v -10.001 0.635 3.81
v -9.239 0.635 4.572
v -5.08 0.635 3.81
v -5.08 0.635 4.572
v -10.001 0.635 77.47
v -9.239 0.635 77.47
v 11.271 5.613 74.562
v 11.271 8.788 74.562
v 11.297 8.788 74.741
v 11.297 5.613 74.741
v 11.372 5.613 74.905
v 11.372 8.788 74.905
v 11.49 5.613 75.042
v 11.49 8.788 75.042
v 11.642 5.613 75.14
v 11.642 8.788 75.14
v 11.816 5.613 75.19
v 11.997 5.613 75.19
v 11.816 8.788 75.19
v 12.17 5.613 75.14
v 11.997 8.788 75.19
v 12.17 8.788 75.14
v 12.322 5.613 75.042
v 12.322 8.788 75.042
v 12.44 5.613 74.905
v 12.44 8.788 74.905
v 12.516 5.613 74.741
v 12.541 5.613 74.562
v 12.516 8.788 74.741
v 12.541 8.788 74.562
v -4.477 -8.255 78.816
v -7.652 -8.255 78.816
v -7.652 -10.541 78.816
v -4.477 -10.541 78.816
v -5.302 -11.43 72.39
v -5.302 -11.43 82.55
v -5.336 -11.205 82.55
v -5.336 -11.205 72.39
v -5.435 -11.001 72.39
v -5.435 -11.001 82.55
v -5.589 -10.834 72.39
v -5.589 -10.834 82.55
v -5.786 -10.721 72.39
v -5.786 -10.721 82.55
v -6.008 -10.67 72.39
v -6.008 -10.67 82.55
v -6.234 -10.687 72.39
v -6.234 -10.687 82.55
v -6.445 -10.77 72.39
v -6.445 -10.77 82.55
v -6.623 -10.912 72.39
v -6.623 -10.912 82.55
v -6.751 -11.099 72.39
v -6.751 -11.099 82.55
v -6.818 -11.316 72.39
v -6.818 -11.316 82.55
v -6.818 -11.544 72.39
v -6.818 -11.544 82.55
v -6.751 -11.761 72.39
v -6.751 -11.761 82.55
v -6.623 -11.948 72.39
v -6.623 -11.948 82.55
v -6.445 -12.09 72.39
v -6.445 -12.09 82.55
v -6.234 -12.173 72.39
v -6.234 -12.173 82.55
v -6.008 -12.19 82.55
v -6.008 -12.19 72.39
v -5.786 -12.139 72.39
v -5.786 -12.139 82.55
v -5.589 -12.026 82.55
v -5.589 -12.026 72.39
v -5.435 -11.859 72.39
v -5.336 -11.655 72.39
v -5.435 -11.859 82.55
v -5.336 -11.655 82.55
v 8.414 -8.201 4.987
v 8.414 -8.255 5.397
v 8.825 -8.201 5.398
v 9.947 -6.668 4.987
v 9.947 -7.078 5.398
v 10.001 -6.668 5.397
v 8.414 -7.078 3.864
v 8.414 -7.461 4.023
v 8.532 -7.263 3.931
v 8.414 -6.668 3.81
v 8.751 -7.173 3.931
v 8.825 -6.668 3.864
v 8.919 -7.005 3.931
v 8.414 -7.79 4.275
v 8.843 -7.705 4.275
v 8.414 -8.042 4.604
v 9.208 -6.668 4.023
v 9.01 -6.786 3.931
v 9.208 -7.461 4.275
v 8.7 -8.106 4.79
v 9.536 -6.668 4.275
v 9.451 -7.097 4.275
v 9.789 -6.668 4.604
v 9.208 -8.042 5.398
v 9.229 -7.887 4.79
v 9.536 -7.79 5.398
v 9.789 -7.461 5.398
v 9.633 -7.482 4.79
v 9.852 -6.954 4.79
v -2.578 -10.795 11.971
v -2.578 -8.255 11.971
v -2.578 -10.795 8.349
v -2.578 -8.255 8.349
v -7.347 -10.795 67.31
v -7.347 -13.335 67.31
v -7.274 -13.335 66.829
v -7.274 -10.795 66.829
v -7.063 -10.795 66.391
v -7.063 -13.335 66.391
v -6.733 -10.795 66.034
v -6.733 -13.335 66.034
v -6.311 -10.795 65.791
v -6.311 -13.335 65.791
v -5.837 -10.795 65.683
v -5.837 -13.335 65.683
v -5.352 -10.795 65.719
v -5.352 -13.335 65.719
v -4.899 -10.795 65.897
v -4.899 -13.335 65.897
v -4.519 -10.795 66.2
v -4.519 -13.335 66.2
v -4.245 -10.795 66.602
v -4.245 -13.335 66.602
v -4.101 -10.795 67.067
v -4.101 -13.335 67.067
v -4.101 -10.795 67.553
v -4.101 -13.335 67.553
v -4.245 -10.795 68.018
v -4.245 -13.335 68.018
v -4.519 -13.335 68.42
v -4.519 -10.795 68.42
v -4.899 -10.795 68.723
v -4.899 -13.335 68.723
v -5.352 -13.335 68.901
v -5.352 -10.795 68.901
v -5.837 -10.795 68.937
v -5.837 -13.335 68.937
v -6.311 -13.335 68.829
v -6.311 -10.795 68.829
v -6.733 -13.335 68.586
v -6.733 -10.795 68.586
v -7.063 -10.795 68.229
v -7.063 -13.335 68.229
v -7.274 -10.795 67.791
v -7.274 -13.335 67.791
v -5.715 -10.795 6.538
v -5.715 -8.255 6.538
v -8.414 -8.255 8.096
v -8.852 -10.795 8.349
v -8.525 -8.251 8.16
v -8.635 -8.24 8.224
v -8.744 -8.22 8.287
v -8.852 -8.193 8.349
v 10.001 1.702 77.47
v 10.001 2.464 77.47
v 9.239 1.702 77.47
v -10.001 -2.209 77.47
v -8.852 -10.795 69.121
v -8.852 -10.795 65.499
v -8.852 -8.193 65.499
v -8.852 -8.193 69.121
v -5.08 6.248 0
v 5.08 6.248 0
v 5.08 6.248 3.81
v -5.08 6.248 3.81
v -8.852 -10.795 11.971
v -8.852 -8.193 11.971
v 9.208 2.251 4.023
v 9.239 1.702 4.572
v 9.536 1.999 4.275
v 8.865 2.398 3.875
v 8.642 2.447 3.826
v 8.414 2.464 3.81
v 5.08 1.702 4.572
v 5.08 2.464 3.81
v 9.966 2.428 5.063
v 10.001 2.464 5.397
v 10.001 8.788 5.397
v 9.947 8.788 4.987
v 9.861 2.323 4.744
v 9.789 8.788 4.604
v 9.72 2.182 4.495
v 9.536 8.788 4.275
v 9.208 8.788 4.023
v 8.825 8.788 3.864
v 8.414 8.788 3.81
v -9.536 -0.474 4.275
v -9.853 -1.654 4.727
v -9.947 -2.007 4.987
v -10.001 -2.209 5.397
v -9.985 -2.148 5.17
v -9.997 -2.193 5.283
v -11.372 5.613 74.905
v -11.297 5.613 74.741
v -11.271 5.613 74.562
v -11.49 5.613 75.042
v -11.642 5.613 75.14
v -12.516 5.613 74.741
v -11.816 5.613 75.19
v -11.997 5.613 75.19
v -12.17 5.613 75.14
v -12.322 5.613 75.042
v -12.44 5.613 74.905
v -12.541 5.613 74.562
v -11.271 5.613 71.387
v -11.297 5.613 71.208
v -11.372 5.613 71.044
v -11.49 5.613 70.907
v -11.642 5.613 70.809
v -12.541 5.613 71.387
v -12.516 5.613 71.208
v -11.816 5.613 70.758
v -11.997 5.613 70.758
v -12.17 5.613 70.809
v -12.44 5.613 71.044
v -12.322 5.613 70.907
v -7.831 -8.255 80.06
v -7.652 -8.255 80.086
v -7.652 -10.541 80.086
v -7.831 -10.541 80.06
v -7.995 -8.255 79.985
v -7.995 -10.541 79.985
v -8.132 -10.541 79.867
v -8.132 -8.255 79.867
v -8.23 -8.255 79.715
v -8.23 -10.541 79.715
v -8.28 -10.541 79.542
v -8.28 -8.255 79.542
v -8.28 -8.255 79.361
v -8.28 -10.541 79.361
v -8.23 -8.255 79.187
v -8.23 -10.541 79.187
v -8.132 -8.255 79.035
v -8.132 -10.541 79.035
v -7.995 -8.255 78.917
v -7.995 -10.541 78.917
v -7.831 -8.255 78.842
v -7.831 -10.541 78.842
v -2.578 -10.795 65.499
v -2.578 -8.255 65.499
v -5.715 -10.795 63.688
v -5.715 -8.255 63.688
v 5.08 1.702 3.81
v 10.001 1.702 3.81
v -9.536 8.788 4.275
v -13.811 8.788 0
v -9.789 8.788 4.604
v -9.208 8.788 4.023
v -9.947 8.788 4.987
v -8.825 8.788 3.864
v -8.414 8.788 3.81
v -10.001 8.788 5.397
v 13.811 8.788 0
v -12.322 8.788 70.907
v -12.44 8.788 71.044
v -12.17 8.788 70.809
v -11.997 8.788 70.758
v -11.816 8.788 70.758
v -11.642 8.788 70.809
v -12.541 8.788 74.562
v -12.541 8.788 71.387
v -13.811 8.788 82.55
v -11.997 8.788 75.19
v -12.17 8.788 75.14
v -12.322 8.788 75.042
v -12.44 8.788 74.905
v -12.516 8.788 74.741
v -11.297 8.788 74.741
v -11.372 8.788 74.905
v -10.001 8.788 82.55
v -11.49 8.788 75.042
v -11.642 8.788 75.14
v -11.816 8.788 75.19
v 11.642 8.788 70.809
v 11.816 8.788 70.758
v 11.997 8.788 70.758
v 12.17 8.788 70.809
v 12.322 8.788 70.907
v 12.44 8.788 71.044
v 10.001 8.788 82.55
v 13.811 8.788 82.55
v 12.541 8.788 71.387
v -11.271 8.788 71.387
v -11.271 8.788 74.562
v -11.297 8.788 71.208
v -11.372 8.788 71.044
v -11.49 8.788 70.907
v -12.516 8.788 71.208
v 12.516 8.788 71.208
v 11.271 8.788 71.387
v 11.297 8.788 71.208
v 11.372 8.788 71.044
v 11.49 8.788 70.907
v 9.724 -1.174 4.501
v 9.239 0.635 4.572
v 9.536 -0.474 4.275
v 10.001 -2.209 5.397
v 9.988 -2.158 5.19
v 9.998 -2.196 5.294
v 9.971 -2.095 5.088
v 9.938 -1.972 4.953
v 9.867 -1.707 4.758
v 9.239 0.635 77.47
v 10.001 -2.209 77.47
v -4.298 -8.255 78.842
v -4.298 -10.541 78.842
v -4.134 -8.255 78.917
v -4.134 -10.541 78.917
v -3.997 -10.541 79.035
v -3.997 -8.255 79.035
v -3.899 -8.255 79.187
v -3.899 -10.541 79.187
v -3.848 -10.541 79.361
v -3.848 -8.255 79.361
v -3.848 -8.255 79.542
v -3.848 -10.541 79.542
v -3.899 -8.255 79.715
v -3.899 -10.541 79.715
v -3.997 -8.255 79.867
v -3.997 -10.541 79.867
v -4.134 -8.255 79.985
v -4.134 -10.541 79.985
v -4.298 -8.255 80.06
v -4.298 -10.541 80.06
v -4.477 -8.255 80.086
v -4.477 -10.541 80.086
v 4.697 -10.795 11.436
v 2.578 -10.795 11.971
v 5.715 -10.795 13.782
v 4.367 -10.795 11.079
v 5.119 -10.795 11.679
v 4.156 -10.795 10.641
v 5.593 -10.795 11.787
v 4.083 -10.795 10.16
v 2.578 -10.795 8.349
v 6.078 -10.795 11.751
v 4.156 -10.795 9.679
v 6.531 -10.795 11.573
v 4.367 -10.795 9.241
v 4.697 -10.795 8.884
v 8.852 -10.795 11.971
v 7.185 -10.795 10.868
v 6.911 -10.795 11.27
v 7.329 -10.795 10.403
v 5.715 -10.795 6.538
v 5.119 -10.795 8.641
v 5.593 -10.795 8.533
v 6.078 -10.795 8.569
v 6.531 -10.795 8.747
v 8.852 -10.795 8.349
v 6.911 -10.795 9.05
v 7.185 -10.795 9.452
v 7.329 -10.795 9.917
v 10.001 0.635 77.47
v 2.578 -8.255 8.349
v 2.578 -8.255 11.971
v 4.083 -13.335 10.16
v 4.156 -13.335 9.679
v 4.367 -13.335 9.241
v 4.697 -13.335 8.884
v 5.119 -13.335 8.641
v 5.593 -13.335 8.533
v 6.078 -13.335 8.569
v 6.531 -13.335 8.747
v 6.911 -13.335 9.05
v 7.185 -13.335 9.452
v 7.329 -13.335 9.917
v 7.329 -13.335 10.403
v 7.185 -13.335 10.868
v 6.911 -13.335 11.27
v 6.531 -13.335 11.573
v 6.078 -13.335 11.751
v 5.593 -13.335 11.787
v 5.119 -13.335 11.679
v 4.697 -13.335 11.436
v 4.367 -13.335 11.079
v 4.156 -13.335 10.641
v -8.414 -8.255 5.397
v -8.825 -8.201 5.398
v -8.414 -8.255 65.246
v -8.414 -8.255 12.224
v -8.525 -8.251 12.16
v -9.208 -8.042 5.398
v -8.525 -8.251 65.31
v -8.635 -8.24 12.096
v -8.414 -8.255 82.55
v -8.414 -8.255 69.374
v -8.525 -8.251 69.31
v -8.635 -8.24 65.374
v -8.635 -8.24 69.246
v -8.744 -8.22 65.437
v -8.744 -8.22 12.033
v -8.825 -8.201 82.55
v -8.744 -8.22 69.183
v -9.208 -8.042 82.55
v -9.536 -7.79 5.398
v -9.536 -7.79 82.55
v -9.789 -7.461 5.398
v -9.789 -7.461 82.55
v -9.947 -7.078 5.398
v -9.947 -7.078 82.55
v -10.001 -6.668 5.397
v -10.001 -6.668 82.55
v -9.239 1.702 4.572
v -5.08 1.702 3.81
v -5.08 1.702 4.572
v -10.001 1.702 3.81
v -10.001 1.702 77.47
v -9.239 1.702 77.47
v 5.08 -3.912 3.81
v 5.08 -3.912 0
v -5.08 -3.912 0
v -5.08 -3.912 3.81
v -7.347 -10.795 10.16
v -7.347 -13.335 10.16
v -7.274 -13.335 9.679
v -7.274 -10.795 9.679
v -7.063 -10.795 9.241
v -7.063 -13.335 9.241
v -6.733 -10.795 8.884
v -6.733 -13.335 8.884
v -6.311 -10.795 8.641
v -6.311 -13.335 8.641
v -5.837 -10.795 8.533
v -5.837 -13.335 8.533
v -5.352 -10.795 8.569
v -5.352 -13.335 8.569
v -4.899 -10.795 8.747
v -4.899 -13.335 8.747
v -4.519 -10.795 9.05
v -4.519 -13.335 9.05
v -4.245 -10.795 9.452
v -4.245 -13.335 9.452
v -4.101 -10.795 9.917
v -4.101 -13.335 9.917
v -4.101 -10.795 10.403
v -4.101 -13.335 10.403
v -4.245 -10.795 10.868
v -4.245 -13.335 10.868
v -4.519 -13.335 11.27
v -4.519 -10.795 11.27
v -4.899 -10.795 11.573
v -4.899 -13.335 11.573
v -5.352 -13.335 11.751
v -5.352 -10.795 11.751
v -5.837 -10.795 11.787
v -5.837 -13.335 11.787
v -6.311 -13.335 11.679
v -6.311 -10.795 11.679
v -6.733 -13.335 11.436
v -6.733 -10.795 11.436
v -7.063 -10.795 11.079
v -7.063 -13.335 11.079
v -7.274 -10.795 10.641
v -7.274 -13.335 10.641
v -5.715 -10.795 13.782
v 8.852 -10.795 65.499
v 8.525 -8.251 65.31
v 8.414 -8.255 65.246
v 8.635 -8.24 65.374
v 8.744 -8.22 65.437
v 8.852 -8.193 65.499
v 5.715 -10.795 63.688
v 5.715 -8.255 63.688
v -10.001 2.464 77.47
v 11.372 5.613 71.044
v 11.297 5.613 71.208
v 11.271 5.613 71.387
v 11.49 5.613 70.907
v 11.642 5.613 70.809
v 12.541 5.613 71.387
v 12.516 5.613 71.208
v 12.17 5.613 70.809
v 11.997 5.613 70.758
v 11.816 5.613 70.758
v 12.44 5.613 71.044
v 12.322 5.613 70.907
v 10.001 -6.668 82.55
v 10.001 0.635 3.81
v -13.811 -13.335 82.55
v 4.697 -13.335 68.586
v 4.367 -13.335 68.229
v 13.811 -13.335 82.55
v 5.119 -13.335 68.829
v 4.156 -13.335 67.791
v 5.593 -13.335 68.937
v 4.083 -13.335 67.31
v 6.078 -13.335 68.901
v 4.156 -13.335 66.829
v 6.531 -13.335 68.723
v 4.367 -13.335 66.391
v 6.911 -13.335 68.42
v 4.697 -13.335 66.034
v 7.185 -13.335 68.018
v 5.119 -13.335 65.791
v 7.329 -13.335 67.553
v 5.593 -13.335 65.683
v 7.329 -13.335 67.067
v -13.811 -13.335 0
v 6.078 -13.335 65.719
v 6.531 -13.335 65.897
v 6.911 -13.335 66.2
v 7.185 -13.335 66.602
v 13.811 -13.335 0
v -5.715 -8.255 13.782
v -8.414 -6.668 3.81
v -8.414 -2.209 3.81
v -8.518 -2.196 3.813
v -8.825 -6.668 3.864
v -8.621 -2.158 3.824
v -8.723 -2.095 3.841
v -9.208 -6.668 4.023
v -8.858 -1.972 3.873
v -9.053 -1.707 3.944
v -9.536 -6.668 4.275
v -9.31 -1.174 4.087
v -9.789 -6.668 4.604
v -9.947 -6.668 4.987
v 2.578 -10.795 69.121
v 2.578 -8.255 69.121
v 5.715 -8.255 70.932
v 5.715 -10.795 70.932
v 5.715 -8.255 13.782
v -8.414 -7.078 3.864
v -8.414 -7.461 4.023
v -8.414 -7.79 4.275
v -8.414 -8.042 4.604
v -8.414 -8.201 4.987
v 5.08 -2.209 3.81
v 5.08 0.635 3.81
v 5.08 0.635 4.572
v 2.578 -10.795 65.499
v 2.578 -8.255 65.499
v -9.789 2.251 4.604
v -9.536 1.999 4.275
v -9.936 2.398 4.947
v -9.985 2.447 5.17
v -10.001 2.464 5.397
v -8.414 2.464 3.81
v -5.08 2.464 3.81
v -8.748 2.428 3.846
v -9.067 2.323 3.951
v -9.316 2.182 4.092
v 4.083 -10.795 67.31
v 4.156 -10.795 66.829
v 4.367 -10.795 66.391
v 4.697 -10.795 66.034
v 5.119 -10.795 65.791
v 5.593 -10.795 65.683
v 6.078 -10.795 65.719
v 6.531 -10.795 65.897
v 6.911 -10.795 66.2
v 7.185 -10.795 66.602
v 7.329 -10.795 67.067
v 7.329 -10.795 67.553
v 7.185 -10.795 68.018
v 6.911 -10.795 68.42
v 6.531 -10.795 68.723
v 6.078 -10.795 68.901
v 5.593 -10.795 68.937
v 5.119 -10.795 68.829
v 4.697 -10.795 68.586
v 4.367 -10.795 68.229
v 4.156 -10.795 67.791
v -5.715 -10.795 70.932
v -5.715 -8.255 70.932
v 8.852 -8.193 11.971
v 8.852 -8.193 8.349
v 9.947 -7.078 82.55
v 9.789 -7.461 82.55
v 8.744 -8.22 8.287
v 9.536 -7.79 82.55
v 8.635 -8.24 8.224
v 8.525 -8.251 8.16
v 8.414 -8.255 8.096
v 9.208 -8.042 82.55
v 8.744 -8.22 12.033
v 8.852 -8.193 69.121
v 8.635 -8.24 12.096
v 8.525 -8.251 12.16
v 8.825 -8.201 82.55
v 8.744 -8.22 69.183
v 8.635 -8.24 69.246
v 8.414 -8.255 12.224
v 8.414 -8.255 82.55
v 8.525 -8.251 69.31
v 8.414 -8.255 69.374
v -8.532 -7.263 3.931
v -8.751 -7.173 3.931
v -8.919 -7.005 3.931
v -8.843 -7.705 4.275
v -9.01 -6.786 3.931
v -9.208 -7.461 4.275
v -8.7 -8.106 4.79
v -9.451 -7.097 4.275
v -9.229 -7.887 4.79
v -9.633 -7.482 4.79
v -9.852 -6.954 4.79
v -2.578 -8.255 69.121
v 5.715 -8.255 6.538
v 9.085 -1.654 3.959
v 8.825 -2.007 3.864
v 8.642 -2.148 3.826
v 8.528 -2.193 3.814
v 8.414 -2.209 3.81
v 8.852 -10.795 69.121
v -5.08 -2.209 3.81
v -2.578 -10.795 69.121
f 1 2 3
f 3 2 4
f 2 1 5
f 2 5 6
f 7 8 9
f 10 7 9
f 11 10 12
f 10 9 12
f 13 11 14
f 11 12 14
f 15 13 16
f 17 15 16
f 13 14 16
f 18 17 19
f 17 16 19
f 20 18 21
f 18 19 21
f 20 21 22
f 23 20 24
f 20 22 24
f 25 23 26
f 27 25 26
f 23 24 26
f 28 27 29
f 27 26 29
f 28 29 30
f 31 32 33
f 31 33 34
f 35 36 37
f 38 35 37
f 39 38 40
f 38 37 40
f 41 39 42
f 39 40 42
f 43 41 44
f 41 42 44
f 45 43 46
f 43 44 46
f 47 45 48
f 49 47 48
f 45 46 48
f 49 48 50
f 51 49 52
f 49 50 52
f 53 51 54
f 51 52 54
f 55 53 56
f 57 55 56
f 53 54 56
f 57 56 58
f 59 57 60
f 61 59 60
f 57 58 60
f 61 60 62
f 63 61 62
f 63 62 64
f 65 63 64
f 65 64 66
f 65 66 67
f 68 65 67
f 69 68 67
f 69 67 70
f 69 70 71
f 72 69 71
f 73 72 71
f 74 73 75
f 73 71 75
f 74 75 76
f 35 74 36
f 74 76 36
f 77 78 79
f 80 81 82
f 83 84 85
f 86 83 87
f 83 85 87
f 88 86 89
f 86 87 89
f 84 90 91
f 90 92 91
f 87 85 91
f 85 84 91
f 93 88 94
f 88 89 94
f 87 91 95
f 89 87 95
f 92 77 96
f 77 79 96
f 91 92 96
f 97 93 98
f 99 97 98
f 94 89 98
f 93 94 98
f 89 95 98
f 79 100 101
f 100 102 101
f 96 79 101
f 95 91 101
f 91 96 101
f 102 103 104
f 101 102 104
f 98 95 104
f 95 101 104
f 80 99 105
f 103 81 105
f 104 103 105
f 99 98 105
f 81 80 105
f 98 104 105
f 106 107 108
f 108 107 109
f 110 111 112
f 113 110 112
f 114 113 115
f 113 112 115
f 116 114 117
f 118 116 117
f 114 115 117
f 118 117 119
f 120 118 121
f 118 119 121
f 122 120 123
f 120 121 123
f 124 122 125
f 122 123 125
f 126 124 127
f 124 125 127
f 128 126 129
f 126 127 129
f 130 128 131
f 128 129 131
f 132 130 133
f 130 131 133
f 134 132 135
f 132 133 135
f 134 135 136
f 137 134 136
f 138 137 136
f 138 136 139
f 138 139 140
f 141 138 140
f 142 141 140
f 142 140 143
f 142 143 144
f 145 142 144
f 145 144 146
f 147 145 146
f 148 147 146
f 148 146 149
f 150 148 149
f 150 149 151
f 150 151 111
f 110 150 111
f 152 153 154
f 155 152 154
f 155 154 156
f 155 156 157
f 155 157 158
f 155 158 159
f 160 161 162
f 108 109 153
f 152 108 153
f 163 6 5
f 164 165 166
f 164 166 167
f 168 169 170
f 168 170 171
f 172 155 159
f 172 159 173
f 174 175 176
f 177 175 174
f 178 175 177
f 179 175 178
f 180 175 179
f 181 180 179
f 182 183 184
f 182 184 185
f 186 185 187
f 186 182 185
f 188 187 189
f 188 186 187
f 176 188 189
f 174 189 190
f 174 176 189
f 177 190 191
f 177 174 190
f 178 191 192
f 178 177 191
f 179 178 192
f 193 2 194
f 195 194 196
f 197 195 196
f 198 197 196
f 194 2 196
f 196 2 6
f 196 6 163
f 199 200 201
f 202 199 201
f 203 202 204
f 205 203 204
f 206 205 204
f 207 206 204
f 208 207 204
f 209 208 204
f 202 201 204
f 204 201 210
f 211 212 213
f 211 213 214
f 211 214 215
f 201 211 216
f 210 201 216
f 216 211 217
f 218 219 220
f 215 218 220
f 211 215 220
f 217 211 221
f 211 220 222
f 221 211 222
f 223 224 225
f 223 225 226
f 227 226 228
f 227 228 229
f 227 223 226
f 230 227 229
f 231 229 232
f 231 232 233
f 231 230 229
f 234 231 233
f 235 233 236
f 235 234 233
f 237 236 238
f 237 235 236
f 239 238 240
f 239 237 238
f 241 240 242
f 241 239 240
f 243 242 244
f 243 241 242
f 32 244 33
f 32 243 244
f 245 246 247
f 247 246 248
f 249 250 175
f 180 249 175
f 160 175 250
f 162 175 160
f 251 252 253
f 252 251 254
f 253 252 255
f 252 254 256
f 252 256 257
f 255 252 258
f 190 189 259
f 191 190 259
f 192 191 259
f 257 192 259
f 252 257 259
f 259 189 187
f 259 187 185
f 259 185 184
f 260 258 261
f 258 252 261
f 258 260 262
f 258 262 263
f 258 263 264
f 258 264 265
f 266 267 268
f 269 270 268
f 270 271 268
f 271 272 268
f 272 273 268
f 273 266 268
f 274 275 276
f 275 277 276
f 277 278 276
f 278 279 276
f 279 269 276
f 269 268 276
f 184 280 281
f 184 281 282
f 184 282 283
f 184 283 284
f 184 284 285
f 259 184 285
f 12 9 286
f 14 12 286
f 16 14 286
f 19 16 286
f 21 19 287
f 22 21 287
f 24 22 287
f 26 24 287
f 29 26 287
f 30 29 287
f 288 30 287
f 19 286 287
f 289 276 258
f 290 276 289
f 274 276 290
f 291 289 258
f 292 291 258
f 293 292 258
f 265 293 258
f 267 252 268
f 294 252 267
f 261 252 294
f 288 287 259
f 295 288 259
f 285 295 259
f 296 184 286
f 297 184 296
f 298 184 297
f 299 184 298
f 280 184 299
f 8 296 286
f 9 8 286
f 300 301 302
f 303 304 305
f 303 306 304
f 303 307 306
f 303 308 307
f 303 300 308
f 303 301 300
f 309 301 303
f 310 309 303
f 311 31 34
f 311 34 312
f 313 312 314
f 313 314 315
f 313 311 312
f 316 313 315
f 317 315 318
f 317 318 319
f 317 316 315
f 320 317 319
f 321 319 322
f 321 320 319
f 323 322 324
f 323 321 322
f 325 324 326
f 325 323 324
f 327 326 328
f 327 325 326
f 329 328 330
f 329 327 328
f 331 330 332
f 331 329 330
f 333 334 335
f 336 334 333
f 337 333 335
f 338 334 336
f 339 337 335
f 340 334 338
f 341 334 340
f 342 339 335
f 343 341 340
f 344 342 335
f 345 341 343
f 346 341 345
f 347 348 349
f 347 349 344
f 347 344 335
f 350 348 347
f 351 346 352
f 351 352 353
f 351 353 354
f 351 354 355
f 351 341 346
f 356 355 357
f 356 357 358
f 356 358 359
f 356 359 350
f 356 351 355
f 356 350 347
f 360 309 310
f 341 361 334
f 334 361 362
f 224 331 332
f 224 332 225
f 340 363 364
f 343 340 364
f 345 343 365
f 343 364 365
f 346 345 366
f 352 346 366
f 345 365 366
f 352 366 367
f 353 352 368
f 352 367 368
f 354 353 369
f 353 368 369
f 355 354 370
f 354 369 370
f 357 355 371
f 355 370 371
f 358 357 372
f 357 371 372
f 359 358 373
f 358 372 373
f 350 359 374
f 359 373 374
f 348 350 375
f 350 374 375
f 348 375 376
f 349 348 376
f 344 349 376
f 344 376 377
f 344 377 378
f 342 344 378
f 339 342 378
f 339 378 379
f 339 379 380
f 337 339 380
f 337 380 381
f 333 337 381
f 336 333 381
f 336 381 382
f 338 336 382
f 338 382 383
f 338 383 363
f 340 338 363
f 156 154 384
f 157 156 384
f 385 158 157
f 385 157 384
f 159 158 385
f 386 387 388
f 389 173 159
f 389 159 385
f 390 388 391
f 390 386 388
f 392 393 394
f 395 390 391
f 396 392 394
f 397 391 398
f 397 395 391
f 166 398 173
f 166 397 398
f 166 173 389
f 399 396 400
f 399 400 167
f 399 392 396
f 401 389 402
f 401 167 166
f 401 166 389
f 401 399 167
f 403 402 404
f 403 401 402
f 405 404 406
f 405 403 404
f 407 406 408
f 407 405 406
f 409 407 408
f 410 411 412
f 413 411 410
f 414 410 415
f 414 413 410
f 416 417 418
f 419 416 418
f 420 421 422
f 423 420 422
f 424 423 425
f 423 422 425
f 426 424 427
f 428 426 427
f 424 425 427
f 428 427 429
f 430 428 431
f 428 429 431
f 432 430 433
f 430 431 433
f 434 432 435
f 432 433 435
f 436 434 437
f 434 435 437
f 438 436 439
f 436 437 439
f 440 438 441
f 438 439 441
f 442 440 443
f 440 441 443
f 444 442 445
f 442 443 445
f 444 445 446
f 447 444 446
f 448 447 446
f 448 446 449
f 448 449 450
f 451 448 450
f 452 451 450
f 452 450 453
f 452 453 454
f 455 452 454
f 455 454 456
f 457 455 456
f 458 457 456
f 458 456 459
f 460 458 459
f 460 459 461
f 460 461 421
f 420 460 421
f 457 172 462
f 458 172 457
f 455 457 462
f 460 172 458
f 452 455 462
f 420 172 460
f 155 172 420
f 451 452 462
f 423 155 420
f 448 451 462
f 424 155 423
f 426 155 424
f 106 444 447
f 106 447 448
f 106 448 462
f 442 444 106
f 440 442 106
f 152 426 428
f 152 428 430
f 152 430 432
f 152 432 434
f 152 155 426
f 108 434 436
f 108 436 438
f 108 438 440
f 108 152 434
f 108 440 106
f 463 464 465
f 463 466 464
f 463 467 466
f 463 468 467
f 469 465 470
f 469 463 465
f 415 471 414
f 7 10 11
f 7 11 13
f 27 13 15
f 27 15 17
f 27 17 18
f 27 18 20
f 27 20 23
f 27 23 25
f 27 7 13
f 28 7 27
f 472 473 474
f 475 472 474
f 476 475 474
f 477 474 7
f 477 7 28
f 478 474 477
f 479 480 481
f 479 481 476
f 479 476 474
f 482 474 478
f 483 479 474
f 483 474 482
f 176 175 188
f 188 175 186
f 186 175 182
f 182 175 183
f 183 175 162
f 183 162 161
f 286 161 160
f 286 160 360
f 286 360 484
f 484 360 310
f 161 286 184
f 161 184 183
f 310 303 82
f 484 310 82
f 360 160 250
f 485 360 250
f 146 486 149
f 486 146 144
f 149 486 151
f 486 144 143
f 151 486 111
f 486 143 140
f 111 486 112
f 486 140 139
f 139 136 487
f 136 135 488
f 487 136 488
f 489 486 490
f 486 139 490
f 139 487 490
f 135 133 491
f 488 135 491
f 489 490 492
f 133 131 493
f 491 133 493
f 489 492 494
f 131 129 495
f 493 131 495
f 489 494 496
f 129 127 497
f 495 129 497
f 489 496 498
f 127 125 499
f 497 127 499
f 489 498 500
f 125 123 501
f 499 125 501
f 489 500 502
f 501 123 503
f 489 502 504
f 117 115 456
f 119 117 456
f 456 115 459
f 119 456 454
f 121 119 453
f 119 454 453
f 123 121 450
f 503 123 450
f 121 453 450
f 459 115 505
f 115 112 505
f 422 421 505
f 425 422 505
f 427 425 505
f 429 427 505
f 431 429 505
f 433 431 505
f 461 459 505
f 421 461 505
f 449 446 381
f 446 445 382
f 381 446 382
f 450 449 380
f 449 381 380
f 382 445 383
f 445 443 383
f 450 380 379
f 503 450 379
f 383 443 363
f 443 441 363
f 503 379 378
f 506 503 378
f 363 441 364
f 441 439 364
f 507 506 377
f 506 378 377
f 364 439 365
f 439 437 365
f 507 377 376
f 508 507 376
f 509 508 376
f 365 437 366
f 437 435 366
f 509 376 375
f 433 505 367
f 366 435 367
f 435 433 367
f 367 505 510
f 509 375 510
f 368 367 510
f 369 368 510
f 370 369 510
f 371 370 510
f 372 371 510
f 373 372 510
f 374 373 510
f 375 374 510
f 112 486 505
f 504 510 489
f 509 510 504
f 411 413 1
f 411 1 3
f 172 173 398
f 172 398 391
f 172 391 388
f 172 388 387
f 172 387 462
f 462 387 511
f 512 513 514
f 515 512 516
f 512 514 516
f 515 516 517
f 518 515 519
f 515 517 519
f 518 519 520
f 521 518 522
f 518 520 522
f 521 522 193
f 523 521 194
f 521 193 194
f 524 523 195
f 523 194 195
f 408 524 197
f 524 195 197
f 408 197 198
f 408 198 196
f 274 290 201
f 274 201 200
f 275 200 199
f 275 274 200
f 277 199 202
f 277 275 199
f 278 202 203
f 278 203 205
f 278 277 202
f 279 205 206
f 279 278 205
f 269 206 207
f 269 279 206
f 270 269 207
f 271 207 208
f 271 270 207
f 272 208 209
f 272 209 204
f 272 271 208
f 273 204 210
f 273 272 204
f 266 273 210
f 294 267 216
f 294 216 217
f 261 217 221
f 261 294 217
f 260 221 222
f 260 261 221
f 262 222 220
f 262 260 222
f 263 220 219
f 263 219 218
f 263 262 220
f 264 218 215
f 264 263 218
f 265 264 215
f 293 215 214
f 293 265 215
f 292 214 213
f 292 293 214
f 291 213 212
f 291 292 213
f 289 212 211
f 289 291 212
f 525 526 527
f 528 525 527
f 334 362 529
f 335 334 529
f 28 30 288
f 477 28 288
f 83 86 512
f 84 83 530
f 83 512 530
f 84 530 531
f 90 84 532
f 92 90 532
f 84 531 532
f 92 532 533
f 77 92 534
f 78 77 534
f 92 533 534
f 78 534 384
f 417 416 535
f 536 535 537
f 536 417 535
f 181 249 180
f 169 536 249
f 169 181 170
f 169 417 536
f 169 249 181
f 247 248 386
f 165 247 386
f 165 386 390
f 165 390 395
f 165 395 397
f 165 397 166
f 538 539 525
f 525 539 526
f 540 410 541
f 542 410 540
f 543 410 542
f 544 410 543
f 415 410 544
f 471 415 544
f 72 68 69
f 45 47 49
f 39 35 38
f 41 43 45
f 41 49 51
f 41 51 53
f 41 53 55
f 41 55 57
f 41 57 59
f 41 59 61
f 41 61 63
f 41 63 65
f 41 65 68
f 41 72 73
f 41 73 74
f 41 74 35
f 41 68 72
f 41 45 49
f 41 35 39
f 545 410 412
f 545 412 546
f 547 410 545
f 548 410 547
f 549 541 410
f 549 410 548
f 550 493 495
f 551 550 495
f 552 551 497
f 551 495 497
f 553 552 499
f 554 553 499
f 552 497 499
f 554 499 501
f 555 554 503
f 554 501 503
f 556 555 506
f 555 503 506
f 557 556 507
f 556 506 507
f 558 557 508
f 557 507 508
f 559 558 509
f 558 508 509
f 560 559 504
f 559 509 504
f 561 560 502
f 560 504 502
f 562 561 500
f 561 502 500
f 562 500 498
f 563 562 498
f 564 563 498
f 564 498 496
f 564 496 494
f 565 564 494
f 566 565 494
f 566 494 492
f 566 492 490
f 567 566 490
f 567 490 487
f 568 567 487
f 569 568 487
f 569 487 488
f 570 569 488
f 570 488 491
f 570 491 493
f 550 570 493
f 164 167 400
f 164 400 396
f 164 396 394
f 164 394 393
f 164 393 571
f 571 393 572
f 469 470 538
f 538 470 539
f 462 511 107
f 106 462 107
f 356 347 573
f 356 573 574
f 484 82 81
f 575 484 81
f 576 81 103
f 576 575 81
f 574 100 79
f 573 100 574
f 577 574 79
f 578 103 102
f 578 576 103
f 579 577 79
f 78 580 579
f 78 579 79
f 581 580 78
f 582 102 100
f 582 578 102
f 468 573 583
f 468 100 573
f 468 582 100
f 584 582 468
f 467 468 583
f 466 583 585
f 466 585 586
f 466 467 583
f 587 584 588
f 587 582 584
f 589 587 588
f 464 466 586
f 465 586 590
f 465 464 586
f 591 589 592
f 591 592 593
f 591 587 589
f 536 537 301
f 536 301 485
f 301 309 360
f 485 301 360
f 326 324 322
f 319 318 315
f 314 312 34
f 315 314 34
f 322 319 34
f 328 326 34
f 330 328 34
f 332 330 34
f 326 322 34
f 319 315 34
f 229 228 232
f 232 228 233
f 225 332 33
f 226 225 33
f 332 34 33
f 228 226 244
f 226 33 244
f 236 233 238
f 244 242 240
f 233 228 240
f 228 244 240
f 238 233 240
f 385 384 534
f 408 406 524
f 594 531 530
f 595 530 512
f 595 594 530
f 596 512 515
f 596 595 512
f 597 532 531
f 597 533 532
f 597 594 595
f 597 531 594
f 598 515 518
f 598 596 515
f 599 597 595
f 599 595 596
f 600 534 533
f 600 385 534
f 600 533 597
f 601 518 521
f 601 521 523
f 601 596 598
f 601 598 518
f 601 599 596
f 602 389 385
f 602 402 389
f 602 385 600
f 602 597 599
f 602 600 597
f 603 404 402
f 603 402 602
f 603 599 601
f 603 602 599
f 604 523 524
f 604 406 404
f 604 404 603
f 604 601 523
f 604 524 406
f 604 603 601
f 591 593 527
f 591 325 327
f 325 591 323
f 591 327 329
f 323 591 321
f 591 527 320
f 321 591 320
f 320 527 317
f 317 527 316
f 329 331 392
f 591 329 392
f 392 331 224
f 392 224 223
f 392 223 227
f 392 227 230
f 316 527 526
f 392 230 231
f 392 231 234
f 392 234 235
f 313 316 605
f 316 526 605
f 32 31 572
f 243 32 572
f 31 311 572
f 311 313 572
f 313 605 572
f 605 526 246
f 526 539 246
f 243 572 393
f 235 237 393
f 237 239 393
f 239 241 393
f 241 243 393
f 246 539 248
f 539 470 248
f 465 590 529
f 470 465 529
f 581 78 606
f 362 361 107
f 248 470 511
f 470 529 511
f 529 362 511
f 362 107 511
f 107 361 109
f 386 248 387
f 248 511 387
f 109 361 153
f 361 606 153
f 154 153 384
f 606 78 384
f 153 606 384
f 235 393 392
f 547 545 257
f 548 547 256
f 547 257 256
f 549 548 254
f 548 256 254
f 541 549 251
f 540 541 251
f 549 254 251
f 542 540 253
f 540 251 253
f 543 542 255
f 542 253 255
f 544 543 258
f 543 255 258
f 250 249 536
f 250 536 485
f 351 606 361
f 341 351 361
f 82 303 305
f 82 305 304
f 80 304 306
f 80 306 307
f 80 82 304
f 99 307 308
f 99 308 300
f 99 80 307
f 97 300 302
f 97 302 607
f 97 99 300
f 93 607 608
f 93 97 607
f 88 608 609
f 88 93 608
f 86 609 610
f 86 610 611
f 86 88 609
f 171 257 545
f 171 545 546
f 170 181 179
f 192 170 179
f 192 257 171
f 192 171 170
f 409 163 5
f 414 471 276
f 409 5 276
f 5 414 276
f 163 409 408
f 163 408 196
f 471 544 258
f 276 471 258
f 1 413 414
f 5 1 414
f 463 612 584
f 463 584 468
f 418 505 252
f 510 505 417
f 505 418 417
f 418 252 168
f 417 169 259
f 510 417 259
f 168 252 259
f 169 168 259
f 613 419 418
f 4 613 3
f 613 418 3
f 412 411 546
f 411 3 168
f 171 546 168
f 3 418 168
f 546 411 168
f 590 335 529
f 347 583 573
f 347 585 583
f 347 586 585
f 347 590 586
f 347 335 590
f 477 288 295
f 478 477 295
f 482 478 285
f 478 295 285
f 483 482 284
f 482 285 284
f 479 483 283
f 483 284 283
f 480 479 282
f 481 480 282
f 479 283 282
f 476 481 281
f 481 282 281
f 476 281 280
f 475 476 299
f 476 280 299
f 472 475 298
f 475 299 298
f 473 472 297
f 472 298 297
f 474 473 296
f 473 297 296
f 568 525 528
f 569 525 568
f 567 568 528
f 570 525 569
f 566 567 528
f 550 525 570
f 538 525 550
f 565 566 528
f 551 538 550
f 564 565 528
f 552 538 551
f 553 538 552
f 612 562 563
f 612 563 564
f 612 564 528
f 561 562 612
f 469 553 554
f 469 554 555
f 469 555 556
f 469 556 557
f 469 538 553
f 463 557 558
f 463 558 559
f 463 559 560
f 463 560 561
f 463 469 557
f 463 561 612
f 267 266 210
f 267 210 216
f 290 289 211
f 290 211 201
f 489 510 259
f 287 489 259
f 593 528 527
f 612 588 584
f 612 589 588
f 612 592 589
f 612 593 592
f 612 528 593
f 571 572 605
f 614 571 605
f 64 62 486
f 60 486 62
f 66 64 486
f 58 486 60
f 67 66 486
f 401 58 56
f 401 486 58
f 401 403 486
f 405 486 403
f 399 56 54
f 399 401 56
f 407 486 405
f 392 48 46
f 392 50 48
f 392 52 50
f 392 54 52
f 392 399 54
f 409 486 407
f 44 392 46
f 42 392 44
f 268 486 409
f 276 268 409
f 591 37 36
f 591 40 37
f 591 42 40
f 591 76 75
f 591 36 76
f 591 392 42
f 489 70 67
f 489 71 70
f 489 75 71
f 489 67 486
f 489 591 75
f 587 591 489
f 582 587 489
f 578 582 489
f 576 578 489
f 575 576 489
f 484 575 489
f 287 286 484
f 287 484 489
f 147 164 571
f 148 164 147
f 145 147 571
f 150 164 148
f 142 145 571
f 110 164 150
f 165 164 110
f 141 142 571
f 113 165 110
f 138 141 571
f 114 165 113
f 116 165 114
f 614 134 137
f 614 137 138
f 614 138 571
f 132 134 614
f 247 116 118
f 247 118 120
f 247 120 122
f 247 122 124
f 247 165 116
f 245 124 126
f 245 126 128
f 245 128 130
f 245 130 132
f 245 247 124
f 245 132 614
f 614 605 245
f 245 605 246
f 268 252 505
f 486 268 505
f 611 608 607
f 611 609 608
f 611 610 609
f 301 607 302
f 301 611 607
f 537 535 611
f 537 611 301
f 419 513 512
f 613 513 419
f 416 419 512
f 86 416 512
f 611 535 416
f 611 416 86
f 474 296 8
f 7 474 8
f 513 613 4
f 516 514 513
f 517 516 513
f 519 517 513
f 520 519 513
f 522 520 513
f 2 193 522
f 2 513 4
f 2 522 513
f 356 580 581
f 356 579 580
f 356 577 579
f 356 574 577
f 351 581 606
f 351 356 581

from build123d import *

# Parameters (mm, degrees)
BOSS_EXTRUDE1_DEPTH            = 82.55
BOSS_EXTRUDE2_START            = -5.08
BOSS_EXTRUDE2_DEPTH            = 77.47
BOSS_EXTRUDE4_REACH            = 89.467
SKETCH8_W                      = 27.6225
SKETCH8_H                      = 3.81
BOSS_EXTRUDE5_REACH            = 88.945
CUT_EXTRUDE1_REACH             = 86.753
SKETCH10_W                     = 10.16
SKETCH10_H                     = 10.16
SKETCH11_W                     = 27.6225
SKETCH11_H                     = 3.2766
CUT_EXTRUDE2_DEPTH             = 85.753025619
FILLET3_R                      = 1.5875
CUT_EXTRUDE3_DEPTH             = 2.286
CUT_EXTRUDE4_DEPTH             = 3.175
F_4_CLEARANCE_HOLE1_D          = 3.2639
CUT_EXTRUDE5_DEPTH             = 2.54
CUT_EXTRUDE5_DIRECTION_2_REACH = 87.415
SKETCH18_R                     = 0.762
CUT_EXTRUDE6_DEPTH             = 10.16


with BuildPart() as part:
    # Sketch1 → Boss-Extrude1 (new body)
    with BuildSketch(Plane.XY):
        Polygon((10.00125, 12.065), (10.00125, -8.255), (-10.00125, -8.255), (-10.00125, 12.065), (-13.81125, 12.065), (-13.81125, -13.335), (13.81125, -13.335), (13.81125, 12.065), align=None)
    extrude(amount=BOSS_EXTRUDE1_DEPTH)

    # Sketch3 → Boss-Extrude2 (add)
    with BuildSketch(Plane.XY.offset(82.55).offset(BOSS_EXTRUDE2_START)):
        Polygon((10.00125, 1.7018), (9.23925, 1.7018), (10.00125, 2.4638), align=None)
        Polygon((10.00125, 0.635), (9.23925, 0.635), (10.00125, -2.208822715), align=None)
        Polygon((-10.00125, 2.4638), (-10.00125, 1.7018), (-9.23925, 1.7018), align=None)
        Polygon((-10.00125, -2.208822715), (-10.00125, 0.635), (-9.23925, 0.635), align=None)
    extrude(amount=-BOSS_EXTRUDE2_DEPTH)

    # Boss-Extrude4: up to this face of the body (flat: up to its plane)
    boss_extrude4_end = Plane(part.part.faces().sort_by_distance((0, -8.255, 41.275))[0])
    # Sketch8 → Boss-Extrude4 (add, up to the picked face)
    with BuildSketch(Plane(origin=(0, 12.065, 0), x_dir=(1, 0, 0), z_dir=(0, 1, 0)), mode=Mode.PRIVATE) as boss_extrude4_sk1:
        with Locations((0, -1.905)):
            Rectangle(SKETCH8_W, SKETCH8_H)
    boss_extrude4_tool1 = split(extrude(boss_extrude4_sk1.sketch, amount=-BOSS_EXTRUDE4_REACH, mode=Mode.PRIVATE), bisect_by=boss_extrude4_end, keep=Keep.BOTH, mode=Mode.PRIVATE)
    add(boss_extrude4_tool1.solids().sort_by(Axis((0, 12.065, 1.905), (0, -1, 0)))[0])

    # Boss-Extrude5: up to this face of the body (flat: up to its plane)
    boss_extrude5_end = Plane(part.part.faces().sort_by_distance((10.00125, 7.2644, 4.623196778))[0])
    # Sketch9 → Boss-Extrude5 (add, up to the picked face)
    with BuildSketch(Plane(origin=(-10.00125, 0, 0), x_dir=(0, 0, -1), z_dir=(1, 0, 0)), mode=Mode.PRIVATE) as boss_extrude5_sk1:
        Polygon((-3.81, 2.4638), (-3.81, 1.7018), (-4.572, 1.7018), align=None)
    boss_extrude5_tool1 = split(extrude(boss_extrude5_sk1.sketch, amount=BOSS_EXTRUDE5_REACH, mode=Mode.PRIVATE), bisect_by=boss_extrude5_end, keep=Keep.BOTH, mode=Mode.PRIVATE)
    # Sketch9 → Boss-Extrude5 (add, up to the picked face)
    with BuildSketch(Plane(origin=(-10.00125, 0, 0), x_dir=(0, 0, -1), z_dir=(1, 0, 0)), mode=Mode.PRIVATE) as boss_extrude5_sk2:
        Polygon((-3.81, 0.635), (-3.81, -2.208822715), (-4.572, 0.635), align=None)
    boss_extrude5_tool2 = split(extrude(boss_extrude5_sk2.sketch, amount=BOSS_EXTRUDE5_REACH, mode=Mode.PRIVATE), bisect_by=boss_extrude5_end, keep=Keep.BOTH, mode=Mode.PRIVATE)
    add(boss_extrude5_tool1.solids().sort_by(Axis((-10.00125, 1.9558, 4.064), (1, 0, 0)))[0])
    add(boss_extrude5_tool2.solids().sort_by(Axis((-10.00125, -0.312941, 4.064), (1, 0, 0)))[0])

    # Sketch10 → Cut-Extrude1 (cut, up to next)
    with BuildSketch(Plane(origin=(0, 0, 0), x_dir=(-1, 0, 0), z_dir=(0, 0, -1)), mode=Mode.PRIVATE) as cut_extrude1_sk1:
        with Locations((0, 1.1684)):
            Rectangle(SKETCH10_W, SKETCH10_H)
    cut_extrude1_tool1 = extrude(cut_extrude1_sk1.sketch, amount=-CUT_EXTRUDE1_REACH, mode=Mode.PRIVATE) & part.part
    add(cut_extrude1_tool1.solids().sort_by_distance((0, 1.1684, 0))[0], mode=Mode.SUBTRACT)

    # Sketch11 → Cut-Extrude2 (cut, through all)
    with BuildSketch(Plane.XY.offset(82.55)):
        with Locations((0, 10.4267)):
            Rectangle(SKETCH11_W, SKETCH11_H)
    extrude(amount=-CUT_EXTRUDE2_DEPTH, mode=Mode.SUBTRACT)

    # Fillet3
    fillet3_edges = [part.edges().sort_by_distance(p)[0] for p in [
        (-10.00125, -8.255, 43.18),
        (10.00125, -8.255, 43.18),
        (10.00125, 5.6261, 3.81),
        (0, -8.255, 3.81),
        (10.00125, -5.231911358, 3.81),
        (-10.00125, 5.6261, 3.81),
        (-10.00125, -5.231911358, 3.81),
    ]]
    fillet(fillet3_edges, radius=FILLET3_R)

    # Sketch13 → Cut-Extrude3 (cut)
    with BuildSketch(Plane(origin=(0, -8.255, 0), x_dir=(1, 0, 0), z_dir=(0, 1, 0))):
        with BuildLine():
            Line((-7.651886934, -78.8162), (-4.476886934, -78.8162))
            ThreePointArc((-4.476886934, -78.8162), (-3.841886934, -79.4512), (-4.476886934, -80.0862))
            Line((-4.476886934, -80.0862), (-7.651886934, -80.0862))
            ThreePointArc((-7.651886934, -80.0862), (-8.286886934, -79.4512), (-7.651886934, -78.8162))
        make_face()
    extrude(amount=-CUT_EXTRUDE3_DEPTH, mode=Mode.SUBTRACT)

    # Sketch14 → Cut-Extrude4 (cut)
    with BuildSketch(Plane(origin=(0, 8.7884, 0), x_dir=(1, 0, 0), z_dir=(0, 1, 0))):
        with BuildLine():
            Line((-11.27125, -71.386954), (-11.27125, -74.561954))
            ThreePointArc((-11.27125, -74.561954), (-11.90625, -75.196954), (-12.54125, -74.561954))
            Line((-12.54125, -74.561954), (-12.54125, -71.386954))
            ThreePointArc((-12.54125, -71.386954), (-11.90625, -70.751954), (-11.27125, -71.386954))
        make_face()
        with BuildLine():
            Line((11.27125, -71.386954), (11.27125, -74.561954))
            ThreePointArc((11.27125, -74.561954), (11.90625, -75.196954), (12.54125, -74.561954))
            Line((12.54125, -74.561954), (12.54125, -71.386954))
            ThreePointArc((12.54125, -71.386954), (11.90625, -70.751954), (11.27125, -71.386954))
        make_face()
    extrude(amount=-CUT_EXTRUDE4_DEPTH, mode=Mode.SUBTRACT)

    # #4 Clearance Hole1 (through all)
    with Locations(Plane(origin=(0, -8.255, 0), x_dir=(1, 0, 0), z_dir=(0, 1, 0))):
        with Locations((-5.715, -10.16), (5.715, -67.31), (-5.715, -67.31), (5.715, -10.16)):
            Hole(F_4_CLEARANCE_HOLE1_D / 2)

    # Sketch17 → Cut-Extrude5 (cut)
    with BuildSketch(Plane(origin=(0, -8.255, 0), x_dir=(1, 0, 0), z_dir=(0, 1, 0))):
        Polygon((-5.715, -13.782180119), (-2.5781, -11.971090059), (-2.5781, -8.348909941), (-5.715, -6.537819881), (-8.8519, -8.348909941), (-8.8519, -11.971090059), align=None)
        Polygon((5.715, -13.782180119), (8.8519, -11.971090059), (8.8519, -8.348909941), (5.715, -6.537819881), (2.5781, -8.348909941), (2.5781, -11.971090059), align=None)
        Polygon((-5.715, -63.687819881), (-8.8519, -65.498909941), (-8.8519, -69.121090059), (-5.715, -70.932180119), (-2.5781, -69.121090059), (-2.5781, -65.498909941), align=None)
        Polygon((5.715, -63.687819881), (2.5781, -65.498909941), (2.5781, -69.121090059), (5.715, -70.932180119), (8.8519, -69.121090059), (8.8519, -65.498909941), align=None)
    extrude(amount=-CUT_EXTRUDE5_DEPTH, mode=Mode.SUBTRACT)

    # Sketch17 → Cut-Extrude5 direction 2 (cut, up to next)
    with BuildSketch(Plane(origin=(0, -8.255, 0), x_dir=(1, 0, 0), z_dir=(0, 1, 0)), mode=Mode.PRIVATE) as cut_extrude5_direction_2_sk1:
        Polygon((-5.715, -13.782180119), (-2.5781, -11.971090059), (-2.5781, -8.348909941), (-5.715, -6.537819881), (-8.8519, -8.348909941), (-8.8519, -11.971090059), align=None)
    cut_extrude5_direction_2_tool1 = extrude(cut_extrude5_direction_2_sk1.sketch, amount=CUT_EXTRUDE5_DIRECTION_2_REACH, mode=Mode.PRIVATE) & part.part
    # Sketch17 → Cut-Extrude5 direction 2 (cut, up to next)
    with BuildSketch(Plane(origin=(0, -8.255, 0), x_dir=(1, 0, 0), z_dir=(0, 1, 0)), mode=Mode.PRIVATE) as cut_extrude5_direction_2_sk2:
        Polygon((5.715, -13.782180119), (8.8519, -11.971090059), (8.8519, -8.348909941), (5.715, -6.537819881), (2.5781, -8.348909941), (2.5781, -11.971090059), align=None)
    cut_extrude5_direction_2_tool2 = extrude(cut_extrude5_direction_2_sk2.sketch, amount=CUT_EXTRUDE5_DIRECTION_2_REACH, mode=Mode.PRIVATE) & part.part
    # Sketch17 → Cut-Extrude5 direction 2 (cut, up to next)
    with BuildSketch(Plane(origin=(0, -8.255, 0), x_dir=(1, 0, 0), z_dir=(0, 1, 0)), mode=Mode.PRIVATE) as cut_extrude5_direction_2_sk3:
        Polygon((-5.715, -63.687819881), (-8.8519, -65.498909941), (-8.8519, -69.121090059), (-5.715, -70.932180119), (-2.5781, -69.121090059), (-2.5781, -65.498909941), align=None)
    cut_extrude5_direction_2_tool3 = extrude(cut_extrude5_direction_2_sk3.sketch, amount=CUT_EXTRUDE5_DIRECTION_2_REACH, mode=Mode.PRIVATE) & part.part
    # Sketch17 → Cut-Extrude5 direction 2 (cut, up to next)
    with BuildSketch(Plane(origin=(0, -8.255, 0), x_dir=(1, 0, 0), z_dir=(0, 1, 0)), mode=Mode.PRIVATE) as cut_extrude5_direction_2_sk4:
        Polygon((5.715, -63.687819881), (2.5781, -65.498909941), (2.5781, -69.121090059), (5.715, -70.932180119), (8.8519, -69.121090059), (8.8519, -65.498909941), align=None)
    cut_extrude5_direction_2_tool4 = extrude(cut_extrude5_direction_2_sk4.sketch, amount=CUT_EXTRUDE5_DIRECTION_2_REACH, mode=Mode.PRIVATE) & part.part
    add(cut_extrude5_direction_2_tool1.solids().sort_by_distance((-5.715, -8.255, 10.16))[0], mode=Mode.SUBTRACT)
    add(cut_extrude5_direction_2_tool2.solids().sort_by_distance((5.715, -8.255, 10.16))[0], mode=Mode.SUBTRACT)
    add(cut_extrude5_direction_2_tool3.solids().sort_by_distance((-5.715, -8.255, 67.31))[0], mode=Mode.SUBTRACT)
    add(cut_extrude5_direction_2_tool4.solids().sort_by_distance((5.715, -8.255, 67.31))[0], mode=Mode.SUBTRACT)

    # Sketch18 → Cut-Extrude6 (cut)
    with BuildSketch(Plane.XY.offset(82.55)):
        with Locations((-6.064467422, -11.430018288)):
            Circle(SKETCH18_R)
    extrude(amount=-CUT_EXTRUDE6_DEPTH, mode=Mode.SUBTRACT)


solid = part.part
